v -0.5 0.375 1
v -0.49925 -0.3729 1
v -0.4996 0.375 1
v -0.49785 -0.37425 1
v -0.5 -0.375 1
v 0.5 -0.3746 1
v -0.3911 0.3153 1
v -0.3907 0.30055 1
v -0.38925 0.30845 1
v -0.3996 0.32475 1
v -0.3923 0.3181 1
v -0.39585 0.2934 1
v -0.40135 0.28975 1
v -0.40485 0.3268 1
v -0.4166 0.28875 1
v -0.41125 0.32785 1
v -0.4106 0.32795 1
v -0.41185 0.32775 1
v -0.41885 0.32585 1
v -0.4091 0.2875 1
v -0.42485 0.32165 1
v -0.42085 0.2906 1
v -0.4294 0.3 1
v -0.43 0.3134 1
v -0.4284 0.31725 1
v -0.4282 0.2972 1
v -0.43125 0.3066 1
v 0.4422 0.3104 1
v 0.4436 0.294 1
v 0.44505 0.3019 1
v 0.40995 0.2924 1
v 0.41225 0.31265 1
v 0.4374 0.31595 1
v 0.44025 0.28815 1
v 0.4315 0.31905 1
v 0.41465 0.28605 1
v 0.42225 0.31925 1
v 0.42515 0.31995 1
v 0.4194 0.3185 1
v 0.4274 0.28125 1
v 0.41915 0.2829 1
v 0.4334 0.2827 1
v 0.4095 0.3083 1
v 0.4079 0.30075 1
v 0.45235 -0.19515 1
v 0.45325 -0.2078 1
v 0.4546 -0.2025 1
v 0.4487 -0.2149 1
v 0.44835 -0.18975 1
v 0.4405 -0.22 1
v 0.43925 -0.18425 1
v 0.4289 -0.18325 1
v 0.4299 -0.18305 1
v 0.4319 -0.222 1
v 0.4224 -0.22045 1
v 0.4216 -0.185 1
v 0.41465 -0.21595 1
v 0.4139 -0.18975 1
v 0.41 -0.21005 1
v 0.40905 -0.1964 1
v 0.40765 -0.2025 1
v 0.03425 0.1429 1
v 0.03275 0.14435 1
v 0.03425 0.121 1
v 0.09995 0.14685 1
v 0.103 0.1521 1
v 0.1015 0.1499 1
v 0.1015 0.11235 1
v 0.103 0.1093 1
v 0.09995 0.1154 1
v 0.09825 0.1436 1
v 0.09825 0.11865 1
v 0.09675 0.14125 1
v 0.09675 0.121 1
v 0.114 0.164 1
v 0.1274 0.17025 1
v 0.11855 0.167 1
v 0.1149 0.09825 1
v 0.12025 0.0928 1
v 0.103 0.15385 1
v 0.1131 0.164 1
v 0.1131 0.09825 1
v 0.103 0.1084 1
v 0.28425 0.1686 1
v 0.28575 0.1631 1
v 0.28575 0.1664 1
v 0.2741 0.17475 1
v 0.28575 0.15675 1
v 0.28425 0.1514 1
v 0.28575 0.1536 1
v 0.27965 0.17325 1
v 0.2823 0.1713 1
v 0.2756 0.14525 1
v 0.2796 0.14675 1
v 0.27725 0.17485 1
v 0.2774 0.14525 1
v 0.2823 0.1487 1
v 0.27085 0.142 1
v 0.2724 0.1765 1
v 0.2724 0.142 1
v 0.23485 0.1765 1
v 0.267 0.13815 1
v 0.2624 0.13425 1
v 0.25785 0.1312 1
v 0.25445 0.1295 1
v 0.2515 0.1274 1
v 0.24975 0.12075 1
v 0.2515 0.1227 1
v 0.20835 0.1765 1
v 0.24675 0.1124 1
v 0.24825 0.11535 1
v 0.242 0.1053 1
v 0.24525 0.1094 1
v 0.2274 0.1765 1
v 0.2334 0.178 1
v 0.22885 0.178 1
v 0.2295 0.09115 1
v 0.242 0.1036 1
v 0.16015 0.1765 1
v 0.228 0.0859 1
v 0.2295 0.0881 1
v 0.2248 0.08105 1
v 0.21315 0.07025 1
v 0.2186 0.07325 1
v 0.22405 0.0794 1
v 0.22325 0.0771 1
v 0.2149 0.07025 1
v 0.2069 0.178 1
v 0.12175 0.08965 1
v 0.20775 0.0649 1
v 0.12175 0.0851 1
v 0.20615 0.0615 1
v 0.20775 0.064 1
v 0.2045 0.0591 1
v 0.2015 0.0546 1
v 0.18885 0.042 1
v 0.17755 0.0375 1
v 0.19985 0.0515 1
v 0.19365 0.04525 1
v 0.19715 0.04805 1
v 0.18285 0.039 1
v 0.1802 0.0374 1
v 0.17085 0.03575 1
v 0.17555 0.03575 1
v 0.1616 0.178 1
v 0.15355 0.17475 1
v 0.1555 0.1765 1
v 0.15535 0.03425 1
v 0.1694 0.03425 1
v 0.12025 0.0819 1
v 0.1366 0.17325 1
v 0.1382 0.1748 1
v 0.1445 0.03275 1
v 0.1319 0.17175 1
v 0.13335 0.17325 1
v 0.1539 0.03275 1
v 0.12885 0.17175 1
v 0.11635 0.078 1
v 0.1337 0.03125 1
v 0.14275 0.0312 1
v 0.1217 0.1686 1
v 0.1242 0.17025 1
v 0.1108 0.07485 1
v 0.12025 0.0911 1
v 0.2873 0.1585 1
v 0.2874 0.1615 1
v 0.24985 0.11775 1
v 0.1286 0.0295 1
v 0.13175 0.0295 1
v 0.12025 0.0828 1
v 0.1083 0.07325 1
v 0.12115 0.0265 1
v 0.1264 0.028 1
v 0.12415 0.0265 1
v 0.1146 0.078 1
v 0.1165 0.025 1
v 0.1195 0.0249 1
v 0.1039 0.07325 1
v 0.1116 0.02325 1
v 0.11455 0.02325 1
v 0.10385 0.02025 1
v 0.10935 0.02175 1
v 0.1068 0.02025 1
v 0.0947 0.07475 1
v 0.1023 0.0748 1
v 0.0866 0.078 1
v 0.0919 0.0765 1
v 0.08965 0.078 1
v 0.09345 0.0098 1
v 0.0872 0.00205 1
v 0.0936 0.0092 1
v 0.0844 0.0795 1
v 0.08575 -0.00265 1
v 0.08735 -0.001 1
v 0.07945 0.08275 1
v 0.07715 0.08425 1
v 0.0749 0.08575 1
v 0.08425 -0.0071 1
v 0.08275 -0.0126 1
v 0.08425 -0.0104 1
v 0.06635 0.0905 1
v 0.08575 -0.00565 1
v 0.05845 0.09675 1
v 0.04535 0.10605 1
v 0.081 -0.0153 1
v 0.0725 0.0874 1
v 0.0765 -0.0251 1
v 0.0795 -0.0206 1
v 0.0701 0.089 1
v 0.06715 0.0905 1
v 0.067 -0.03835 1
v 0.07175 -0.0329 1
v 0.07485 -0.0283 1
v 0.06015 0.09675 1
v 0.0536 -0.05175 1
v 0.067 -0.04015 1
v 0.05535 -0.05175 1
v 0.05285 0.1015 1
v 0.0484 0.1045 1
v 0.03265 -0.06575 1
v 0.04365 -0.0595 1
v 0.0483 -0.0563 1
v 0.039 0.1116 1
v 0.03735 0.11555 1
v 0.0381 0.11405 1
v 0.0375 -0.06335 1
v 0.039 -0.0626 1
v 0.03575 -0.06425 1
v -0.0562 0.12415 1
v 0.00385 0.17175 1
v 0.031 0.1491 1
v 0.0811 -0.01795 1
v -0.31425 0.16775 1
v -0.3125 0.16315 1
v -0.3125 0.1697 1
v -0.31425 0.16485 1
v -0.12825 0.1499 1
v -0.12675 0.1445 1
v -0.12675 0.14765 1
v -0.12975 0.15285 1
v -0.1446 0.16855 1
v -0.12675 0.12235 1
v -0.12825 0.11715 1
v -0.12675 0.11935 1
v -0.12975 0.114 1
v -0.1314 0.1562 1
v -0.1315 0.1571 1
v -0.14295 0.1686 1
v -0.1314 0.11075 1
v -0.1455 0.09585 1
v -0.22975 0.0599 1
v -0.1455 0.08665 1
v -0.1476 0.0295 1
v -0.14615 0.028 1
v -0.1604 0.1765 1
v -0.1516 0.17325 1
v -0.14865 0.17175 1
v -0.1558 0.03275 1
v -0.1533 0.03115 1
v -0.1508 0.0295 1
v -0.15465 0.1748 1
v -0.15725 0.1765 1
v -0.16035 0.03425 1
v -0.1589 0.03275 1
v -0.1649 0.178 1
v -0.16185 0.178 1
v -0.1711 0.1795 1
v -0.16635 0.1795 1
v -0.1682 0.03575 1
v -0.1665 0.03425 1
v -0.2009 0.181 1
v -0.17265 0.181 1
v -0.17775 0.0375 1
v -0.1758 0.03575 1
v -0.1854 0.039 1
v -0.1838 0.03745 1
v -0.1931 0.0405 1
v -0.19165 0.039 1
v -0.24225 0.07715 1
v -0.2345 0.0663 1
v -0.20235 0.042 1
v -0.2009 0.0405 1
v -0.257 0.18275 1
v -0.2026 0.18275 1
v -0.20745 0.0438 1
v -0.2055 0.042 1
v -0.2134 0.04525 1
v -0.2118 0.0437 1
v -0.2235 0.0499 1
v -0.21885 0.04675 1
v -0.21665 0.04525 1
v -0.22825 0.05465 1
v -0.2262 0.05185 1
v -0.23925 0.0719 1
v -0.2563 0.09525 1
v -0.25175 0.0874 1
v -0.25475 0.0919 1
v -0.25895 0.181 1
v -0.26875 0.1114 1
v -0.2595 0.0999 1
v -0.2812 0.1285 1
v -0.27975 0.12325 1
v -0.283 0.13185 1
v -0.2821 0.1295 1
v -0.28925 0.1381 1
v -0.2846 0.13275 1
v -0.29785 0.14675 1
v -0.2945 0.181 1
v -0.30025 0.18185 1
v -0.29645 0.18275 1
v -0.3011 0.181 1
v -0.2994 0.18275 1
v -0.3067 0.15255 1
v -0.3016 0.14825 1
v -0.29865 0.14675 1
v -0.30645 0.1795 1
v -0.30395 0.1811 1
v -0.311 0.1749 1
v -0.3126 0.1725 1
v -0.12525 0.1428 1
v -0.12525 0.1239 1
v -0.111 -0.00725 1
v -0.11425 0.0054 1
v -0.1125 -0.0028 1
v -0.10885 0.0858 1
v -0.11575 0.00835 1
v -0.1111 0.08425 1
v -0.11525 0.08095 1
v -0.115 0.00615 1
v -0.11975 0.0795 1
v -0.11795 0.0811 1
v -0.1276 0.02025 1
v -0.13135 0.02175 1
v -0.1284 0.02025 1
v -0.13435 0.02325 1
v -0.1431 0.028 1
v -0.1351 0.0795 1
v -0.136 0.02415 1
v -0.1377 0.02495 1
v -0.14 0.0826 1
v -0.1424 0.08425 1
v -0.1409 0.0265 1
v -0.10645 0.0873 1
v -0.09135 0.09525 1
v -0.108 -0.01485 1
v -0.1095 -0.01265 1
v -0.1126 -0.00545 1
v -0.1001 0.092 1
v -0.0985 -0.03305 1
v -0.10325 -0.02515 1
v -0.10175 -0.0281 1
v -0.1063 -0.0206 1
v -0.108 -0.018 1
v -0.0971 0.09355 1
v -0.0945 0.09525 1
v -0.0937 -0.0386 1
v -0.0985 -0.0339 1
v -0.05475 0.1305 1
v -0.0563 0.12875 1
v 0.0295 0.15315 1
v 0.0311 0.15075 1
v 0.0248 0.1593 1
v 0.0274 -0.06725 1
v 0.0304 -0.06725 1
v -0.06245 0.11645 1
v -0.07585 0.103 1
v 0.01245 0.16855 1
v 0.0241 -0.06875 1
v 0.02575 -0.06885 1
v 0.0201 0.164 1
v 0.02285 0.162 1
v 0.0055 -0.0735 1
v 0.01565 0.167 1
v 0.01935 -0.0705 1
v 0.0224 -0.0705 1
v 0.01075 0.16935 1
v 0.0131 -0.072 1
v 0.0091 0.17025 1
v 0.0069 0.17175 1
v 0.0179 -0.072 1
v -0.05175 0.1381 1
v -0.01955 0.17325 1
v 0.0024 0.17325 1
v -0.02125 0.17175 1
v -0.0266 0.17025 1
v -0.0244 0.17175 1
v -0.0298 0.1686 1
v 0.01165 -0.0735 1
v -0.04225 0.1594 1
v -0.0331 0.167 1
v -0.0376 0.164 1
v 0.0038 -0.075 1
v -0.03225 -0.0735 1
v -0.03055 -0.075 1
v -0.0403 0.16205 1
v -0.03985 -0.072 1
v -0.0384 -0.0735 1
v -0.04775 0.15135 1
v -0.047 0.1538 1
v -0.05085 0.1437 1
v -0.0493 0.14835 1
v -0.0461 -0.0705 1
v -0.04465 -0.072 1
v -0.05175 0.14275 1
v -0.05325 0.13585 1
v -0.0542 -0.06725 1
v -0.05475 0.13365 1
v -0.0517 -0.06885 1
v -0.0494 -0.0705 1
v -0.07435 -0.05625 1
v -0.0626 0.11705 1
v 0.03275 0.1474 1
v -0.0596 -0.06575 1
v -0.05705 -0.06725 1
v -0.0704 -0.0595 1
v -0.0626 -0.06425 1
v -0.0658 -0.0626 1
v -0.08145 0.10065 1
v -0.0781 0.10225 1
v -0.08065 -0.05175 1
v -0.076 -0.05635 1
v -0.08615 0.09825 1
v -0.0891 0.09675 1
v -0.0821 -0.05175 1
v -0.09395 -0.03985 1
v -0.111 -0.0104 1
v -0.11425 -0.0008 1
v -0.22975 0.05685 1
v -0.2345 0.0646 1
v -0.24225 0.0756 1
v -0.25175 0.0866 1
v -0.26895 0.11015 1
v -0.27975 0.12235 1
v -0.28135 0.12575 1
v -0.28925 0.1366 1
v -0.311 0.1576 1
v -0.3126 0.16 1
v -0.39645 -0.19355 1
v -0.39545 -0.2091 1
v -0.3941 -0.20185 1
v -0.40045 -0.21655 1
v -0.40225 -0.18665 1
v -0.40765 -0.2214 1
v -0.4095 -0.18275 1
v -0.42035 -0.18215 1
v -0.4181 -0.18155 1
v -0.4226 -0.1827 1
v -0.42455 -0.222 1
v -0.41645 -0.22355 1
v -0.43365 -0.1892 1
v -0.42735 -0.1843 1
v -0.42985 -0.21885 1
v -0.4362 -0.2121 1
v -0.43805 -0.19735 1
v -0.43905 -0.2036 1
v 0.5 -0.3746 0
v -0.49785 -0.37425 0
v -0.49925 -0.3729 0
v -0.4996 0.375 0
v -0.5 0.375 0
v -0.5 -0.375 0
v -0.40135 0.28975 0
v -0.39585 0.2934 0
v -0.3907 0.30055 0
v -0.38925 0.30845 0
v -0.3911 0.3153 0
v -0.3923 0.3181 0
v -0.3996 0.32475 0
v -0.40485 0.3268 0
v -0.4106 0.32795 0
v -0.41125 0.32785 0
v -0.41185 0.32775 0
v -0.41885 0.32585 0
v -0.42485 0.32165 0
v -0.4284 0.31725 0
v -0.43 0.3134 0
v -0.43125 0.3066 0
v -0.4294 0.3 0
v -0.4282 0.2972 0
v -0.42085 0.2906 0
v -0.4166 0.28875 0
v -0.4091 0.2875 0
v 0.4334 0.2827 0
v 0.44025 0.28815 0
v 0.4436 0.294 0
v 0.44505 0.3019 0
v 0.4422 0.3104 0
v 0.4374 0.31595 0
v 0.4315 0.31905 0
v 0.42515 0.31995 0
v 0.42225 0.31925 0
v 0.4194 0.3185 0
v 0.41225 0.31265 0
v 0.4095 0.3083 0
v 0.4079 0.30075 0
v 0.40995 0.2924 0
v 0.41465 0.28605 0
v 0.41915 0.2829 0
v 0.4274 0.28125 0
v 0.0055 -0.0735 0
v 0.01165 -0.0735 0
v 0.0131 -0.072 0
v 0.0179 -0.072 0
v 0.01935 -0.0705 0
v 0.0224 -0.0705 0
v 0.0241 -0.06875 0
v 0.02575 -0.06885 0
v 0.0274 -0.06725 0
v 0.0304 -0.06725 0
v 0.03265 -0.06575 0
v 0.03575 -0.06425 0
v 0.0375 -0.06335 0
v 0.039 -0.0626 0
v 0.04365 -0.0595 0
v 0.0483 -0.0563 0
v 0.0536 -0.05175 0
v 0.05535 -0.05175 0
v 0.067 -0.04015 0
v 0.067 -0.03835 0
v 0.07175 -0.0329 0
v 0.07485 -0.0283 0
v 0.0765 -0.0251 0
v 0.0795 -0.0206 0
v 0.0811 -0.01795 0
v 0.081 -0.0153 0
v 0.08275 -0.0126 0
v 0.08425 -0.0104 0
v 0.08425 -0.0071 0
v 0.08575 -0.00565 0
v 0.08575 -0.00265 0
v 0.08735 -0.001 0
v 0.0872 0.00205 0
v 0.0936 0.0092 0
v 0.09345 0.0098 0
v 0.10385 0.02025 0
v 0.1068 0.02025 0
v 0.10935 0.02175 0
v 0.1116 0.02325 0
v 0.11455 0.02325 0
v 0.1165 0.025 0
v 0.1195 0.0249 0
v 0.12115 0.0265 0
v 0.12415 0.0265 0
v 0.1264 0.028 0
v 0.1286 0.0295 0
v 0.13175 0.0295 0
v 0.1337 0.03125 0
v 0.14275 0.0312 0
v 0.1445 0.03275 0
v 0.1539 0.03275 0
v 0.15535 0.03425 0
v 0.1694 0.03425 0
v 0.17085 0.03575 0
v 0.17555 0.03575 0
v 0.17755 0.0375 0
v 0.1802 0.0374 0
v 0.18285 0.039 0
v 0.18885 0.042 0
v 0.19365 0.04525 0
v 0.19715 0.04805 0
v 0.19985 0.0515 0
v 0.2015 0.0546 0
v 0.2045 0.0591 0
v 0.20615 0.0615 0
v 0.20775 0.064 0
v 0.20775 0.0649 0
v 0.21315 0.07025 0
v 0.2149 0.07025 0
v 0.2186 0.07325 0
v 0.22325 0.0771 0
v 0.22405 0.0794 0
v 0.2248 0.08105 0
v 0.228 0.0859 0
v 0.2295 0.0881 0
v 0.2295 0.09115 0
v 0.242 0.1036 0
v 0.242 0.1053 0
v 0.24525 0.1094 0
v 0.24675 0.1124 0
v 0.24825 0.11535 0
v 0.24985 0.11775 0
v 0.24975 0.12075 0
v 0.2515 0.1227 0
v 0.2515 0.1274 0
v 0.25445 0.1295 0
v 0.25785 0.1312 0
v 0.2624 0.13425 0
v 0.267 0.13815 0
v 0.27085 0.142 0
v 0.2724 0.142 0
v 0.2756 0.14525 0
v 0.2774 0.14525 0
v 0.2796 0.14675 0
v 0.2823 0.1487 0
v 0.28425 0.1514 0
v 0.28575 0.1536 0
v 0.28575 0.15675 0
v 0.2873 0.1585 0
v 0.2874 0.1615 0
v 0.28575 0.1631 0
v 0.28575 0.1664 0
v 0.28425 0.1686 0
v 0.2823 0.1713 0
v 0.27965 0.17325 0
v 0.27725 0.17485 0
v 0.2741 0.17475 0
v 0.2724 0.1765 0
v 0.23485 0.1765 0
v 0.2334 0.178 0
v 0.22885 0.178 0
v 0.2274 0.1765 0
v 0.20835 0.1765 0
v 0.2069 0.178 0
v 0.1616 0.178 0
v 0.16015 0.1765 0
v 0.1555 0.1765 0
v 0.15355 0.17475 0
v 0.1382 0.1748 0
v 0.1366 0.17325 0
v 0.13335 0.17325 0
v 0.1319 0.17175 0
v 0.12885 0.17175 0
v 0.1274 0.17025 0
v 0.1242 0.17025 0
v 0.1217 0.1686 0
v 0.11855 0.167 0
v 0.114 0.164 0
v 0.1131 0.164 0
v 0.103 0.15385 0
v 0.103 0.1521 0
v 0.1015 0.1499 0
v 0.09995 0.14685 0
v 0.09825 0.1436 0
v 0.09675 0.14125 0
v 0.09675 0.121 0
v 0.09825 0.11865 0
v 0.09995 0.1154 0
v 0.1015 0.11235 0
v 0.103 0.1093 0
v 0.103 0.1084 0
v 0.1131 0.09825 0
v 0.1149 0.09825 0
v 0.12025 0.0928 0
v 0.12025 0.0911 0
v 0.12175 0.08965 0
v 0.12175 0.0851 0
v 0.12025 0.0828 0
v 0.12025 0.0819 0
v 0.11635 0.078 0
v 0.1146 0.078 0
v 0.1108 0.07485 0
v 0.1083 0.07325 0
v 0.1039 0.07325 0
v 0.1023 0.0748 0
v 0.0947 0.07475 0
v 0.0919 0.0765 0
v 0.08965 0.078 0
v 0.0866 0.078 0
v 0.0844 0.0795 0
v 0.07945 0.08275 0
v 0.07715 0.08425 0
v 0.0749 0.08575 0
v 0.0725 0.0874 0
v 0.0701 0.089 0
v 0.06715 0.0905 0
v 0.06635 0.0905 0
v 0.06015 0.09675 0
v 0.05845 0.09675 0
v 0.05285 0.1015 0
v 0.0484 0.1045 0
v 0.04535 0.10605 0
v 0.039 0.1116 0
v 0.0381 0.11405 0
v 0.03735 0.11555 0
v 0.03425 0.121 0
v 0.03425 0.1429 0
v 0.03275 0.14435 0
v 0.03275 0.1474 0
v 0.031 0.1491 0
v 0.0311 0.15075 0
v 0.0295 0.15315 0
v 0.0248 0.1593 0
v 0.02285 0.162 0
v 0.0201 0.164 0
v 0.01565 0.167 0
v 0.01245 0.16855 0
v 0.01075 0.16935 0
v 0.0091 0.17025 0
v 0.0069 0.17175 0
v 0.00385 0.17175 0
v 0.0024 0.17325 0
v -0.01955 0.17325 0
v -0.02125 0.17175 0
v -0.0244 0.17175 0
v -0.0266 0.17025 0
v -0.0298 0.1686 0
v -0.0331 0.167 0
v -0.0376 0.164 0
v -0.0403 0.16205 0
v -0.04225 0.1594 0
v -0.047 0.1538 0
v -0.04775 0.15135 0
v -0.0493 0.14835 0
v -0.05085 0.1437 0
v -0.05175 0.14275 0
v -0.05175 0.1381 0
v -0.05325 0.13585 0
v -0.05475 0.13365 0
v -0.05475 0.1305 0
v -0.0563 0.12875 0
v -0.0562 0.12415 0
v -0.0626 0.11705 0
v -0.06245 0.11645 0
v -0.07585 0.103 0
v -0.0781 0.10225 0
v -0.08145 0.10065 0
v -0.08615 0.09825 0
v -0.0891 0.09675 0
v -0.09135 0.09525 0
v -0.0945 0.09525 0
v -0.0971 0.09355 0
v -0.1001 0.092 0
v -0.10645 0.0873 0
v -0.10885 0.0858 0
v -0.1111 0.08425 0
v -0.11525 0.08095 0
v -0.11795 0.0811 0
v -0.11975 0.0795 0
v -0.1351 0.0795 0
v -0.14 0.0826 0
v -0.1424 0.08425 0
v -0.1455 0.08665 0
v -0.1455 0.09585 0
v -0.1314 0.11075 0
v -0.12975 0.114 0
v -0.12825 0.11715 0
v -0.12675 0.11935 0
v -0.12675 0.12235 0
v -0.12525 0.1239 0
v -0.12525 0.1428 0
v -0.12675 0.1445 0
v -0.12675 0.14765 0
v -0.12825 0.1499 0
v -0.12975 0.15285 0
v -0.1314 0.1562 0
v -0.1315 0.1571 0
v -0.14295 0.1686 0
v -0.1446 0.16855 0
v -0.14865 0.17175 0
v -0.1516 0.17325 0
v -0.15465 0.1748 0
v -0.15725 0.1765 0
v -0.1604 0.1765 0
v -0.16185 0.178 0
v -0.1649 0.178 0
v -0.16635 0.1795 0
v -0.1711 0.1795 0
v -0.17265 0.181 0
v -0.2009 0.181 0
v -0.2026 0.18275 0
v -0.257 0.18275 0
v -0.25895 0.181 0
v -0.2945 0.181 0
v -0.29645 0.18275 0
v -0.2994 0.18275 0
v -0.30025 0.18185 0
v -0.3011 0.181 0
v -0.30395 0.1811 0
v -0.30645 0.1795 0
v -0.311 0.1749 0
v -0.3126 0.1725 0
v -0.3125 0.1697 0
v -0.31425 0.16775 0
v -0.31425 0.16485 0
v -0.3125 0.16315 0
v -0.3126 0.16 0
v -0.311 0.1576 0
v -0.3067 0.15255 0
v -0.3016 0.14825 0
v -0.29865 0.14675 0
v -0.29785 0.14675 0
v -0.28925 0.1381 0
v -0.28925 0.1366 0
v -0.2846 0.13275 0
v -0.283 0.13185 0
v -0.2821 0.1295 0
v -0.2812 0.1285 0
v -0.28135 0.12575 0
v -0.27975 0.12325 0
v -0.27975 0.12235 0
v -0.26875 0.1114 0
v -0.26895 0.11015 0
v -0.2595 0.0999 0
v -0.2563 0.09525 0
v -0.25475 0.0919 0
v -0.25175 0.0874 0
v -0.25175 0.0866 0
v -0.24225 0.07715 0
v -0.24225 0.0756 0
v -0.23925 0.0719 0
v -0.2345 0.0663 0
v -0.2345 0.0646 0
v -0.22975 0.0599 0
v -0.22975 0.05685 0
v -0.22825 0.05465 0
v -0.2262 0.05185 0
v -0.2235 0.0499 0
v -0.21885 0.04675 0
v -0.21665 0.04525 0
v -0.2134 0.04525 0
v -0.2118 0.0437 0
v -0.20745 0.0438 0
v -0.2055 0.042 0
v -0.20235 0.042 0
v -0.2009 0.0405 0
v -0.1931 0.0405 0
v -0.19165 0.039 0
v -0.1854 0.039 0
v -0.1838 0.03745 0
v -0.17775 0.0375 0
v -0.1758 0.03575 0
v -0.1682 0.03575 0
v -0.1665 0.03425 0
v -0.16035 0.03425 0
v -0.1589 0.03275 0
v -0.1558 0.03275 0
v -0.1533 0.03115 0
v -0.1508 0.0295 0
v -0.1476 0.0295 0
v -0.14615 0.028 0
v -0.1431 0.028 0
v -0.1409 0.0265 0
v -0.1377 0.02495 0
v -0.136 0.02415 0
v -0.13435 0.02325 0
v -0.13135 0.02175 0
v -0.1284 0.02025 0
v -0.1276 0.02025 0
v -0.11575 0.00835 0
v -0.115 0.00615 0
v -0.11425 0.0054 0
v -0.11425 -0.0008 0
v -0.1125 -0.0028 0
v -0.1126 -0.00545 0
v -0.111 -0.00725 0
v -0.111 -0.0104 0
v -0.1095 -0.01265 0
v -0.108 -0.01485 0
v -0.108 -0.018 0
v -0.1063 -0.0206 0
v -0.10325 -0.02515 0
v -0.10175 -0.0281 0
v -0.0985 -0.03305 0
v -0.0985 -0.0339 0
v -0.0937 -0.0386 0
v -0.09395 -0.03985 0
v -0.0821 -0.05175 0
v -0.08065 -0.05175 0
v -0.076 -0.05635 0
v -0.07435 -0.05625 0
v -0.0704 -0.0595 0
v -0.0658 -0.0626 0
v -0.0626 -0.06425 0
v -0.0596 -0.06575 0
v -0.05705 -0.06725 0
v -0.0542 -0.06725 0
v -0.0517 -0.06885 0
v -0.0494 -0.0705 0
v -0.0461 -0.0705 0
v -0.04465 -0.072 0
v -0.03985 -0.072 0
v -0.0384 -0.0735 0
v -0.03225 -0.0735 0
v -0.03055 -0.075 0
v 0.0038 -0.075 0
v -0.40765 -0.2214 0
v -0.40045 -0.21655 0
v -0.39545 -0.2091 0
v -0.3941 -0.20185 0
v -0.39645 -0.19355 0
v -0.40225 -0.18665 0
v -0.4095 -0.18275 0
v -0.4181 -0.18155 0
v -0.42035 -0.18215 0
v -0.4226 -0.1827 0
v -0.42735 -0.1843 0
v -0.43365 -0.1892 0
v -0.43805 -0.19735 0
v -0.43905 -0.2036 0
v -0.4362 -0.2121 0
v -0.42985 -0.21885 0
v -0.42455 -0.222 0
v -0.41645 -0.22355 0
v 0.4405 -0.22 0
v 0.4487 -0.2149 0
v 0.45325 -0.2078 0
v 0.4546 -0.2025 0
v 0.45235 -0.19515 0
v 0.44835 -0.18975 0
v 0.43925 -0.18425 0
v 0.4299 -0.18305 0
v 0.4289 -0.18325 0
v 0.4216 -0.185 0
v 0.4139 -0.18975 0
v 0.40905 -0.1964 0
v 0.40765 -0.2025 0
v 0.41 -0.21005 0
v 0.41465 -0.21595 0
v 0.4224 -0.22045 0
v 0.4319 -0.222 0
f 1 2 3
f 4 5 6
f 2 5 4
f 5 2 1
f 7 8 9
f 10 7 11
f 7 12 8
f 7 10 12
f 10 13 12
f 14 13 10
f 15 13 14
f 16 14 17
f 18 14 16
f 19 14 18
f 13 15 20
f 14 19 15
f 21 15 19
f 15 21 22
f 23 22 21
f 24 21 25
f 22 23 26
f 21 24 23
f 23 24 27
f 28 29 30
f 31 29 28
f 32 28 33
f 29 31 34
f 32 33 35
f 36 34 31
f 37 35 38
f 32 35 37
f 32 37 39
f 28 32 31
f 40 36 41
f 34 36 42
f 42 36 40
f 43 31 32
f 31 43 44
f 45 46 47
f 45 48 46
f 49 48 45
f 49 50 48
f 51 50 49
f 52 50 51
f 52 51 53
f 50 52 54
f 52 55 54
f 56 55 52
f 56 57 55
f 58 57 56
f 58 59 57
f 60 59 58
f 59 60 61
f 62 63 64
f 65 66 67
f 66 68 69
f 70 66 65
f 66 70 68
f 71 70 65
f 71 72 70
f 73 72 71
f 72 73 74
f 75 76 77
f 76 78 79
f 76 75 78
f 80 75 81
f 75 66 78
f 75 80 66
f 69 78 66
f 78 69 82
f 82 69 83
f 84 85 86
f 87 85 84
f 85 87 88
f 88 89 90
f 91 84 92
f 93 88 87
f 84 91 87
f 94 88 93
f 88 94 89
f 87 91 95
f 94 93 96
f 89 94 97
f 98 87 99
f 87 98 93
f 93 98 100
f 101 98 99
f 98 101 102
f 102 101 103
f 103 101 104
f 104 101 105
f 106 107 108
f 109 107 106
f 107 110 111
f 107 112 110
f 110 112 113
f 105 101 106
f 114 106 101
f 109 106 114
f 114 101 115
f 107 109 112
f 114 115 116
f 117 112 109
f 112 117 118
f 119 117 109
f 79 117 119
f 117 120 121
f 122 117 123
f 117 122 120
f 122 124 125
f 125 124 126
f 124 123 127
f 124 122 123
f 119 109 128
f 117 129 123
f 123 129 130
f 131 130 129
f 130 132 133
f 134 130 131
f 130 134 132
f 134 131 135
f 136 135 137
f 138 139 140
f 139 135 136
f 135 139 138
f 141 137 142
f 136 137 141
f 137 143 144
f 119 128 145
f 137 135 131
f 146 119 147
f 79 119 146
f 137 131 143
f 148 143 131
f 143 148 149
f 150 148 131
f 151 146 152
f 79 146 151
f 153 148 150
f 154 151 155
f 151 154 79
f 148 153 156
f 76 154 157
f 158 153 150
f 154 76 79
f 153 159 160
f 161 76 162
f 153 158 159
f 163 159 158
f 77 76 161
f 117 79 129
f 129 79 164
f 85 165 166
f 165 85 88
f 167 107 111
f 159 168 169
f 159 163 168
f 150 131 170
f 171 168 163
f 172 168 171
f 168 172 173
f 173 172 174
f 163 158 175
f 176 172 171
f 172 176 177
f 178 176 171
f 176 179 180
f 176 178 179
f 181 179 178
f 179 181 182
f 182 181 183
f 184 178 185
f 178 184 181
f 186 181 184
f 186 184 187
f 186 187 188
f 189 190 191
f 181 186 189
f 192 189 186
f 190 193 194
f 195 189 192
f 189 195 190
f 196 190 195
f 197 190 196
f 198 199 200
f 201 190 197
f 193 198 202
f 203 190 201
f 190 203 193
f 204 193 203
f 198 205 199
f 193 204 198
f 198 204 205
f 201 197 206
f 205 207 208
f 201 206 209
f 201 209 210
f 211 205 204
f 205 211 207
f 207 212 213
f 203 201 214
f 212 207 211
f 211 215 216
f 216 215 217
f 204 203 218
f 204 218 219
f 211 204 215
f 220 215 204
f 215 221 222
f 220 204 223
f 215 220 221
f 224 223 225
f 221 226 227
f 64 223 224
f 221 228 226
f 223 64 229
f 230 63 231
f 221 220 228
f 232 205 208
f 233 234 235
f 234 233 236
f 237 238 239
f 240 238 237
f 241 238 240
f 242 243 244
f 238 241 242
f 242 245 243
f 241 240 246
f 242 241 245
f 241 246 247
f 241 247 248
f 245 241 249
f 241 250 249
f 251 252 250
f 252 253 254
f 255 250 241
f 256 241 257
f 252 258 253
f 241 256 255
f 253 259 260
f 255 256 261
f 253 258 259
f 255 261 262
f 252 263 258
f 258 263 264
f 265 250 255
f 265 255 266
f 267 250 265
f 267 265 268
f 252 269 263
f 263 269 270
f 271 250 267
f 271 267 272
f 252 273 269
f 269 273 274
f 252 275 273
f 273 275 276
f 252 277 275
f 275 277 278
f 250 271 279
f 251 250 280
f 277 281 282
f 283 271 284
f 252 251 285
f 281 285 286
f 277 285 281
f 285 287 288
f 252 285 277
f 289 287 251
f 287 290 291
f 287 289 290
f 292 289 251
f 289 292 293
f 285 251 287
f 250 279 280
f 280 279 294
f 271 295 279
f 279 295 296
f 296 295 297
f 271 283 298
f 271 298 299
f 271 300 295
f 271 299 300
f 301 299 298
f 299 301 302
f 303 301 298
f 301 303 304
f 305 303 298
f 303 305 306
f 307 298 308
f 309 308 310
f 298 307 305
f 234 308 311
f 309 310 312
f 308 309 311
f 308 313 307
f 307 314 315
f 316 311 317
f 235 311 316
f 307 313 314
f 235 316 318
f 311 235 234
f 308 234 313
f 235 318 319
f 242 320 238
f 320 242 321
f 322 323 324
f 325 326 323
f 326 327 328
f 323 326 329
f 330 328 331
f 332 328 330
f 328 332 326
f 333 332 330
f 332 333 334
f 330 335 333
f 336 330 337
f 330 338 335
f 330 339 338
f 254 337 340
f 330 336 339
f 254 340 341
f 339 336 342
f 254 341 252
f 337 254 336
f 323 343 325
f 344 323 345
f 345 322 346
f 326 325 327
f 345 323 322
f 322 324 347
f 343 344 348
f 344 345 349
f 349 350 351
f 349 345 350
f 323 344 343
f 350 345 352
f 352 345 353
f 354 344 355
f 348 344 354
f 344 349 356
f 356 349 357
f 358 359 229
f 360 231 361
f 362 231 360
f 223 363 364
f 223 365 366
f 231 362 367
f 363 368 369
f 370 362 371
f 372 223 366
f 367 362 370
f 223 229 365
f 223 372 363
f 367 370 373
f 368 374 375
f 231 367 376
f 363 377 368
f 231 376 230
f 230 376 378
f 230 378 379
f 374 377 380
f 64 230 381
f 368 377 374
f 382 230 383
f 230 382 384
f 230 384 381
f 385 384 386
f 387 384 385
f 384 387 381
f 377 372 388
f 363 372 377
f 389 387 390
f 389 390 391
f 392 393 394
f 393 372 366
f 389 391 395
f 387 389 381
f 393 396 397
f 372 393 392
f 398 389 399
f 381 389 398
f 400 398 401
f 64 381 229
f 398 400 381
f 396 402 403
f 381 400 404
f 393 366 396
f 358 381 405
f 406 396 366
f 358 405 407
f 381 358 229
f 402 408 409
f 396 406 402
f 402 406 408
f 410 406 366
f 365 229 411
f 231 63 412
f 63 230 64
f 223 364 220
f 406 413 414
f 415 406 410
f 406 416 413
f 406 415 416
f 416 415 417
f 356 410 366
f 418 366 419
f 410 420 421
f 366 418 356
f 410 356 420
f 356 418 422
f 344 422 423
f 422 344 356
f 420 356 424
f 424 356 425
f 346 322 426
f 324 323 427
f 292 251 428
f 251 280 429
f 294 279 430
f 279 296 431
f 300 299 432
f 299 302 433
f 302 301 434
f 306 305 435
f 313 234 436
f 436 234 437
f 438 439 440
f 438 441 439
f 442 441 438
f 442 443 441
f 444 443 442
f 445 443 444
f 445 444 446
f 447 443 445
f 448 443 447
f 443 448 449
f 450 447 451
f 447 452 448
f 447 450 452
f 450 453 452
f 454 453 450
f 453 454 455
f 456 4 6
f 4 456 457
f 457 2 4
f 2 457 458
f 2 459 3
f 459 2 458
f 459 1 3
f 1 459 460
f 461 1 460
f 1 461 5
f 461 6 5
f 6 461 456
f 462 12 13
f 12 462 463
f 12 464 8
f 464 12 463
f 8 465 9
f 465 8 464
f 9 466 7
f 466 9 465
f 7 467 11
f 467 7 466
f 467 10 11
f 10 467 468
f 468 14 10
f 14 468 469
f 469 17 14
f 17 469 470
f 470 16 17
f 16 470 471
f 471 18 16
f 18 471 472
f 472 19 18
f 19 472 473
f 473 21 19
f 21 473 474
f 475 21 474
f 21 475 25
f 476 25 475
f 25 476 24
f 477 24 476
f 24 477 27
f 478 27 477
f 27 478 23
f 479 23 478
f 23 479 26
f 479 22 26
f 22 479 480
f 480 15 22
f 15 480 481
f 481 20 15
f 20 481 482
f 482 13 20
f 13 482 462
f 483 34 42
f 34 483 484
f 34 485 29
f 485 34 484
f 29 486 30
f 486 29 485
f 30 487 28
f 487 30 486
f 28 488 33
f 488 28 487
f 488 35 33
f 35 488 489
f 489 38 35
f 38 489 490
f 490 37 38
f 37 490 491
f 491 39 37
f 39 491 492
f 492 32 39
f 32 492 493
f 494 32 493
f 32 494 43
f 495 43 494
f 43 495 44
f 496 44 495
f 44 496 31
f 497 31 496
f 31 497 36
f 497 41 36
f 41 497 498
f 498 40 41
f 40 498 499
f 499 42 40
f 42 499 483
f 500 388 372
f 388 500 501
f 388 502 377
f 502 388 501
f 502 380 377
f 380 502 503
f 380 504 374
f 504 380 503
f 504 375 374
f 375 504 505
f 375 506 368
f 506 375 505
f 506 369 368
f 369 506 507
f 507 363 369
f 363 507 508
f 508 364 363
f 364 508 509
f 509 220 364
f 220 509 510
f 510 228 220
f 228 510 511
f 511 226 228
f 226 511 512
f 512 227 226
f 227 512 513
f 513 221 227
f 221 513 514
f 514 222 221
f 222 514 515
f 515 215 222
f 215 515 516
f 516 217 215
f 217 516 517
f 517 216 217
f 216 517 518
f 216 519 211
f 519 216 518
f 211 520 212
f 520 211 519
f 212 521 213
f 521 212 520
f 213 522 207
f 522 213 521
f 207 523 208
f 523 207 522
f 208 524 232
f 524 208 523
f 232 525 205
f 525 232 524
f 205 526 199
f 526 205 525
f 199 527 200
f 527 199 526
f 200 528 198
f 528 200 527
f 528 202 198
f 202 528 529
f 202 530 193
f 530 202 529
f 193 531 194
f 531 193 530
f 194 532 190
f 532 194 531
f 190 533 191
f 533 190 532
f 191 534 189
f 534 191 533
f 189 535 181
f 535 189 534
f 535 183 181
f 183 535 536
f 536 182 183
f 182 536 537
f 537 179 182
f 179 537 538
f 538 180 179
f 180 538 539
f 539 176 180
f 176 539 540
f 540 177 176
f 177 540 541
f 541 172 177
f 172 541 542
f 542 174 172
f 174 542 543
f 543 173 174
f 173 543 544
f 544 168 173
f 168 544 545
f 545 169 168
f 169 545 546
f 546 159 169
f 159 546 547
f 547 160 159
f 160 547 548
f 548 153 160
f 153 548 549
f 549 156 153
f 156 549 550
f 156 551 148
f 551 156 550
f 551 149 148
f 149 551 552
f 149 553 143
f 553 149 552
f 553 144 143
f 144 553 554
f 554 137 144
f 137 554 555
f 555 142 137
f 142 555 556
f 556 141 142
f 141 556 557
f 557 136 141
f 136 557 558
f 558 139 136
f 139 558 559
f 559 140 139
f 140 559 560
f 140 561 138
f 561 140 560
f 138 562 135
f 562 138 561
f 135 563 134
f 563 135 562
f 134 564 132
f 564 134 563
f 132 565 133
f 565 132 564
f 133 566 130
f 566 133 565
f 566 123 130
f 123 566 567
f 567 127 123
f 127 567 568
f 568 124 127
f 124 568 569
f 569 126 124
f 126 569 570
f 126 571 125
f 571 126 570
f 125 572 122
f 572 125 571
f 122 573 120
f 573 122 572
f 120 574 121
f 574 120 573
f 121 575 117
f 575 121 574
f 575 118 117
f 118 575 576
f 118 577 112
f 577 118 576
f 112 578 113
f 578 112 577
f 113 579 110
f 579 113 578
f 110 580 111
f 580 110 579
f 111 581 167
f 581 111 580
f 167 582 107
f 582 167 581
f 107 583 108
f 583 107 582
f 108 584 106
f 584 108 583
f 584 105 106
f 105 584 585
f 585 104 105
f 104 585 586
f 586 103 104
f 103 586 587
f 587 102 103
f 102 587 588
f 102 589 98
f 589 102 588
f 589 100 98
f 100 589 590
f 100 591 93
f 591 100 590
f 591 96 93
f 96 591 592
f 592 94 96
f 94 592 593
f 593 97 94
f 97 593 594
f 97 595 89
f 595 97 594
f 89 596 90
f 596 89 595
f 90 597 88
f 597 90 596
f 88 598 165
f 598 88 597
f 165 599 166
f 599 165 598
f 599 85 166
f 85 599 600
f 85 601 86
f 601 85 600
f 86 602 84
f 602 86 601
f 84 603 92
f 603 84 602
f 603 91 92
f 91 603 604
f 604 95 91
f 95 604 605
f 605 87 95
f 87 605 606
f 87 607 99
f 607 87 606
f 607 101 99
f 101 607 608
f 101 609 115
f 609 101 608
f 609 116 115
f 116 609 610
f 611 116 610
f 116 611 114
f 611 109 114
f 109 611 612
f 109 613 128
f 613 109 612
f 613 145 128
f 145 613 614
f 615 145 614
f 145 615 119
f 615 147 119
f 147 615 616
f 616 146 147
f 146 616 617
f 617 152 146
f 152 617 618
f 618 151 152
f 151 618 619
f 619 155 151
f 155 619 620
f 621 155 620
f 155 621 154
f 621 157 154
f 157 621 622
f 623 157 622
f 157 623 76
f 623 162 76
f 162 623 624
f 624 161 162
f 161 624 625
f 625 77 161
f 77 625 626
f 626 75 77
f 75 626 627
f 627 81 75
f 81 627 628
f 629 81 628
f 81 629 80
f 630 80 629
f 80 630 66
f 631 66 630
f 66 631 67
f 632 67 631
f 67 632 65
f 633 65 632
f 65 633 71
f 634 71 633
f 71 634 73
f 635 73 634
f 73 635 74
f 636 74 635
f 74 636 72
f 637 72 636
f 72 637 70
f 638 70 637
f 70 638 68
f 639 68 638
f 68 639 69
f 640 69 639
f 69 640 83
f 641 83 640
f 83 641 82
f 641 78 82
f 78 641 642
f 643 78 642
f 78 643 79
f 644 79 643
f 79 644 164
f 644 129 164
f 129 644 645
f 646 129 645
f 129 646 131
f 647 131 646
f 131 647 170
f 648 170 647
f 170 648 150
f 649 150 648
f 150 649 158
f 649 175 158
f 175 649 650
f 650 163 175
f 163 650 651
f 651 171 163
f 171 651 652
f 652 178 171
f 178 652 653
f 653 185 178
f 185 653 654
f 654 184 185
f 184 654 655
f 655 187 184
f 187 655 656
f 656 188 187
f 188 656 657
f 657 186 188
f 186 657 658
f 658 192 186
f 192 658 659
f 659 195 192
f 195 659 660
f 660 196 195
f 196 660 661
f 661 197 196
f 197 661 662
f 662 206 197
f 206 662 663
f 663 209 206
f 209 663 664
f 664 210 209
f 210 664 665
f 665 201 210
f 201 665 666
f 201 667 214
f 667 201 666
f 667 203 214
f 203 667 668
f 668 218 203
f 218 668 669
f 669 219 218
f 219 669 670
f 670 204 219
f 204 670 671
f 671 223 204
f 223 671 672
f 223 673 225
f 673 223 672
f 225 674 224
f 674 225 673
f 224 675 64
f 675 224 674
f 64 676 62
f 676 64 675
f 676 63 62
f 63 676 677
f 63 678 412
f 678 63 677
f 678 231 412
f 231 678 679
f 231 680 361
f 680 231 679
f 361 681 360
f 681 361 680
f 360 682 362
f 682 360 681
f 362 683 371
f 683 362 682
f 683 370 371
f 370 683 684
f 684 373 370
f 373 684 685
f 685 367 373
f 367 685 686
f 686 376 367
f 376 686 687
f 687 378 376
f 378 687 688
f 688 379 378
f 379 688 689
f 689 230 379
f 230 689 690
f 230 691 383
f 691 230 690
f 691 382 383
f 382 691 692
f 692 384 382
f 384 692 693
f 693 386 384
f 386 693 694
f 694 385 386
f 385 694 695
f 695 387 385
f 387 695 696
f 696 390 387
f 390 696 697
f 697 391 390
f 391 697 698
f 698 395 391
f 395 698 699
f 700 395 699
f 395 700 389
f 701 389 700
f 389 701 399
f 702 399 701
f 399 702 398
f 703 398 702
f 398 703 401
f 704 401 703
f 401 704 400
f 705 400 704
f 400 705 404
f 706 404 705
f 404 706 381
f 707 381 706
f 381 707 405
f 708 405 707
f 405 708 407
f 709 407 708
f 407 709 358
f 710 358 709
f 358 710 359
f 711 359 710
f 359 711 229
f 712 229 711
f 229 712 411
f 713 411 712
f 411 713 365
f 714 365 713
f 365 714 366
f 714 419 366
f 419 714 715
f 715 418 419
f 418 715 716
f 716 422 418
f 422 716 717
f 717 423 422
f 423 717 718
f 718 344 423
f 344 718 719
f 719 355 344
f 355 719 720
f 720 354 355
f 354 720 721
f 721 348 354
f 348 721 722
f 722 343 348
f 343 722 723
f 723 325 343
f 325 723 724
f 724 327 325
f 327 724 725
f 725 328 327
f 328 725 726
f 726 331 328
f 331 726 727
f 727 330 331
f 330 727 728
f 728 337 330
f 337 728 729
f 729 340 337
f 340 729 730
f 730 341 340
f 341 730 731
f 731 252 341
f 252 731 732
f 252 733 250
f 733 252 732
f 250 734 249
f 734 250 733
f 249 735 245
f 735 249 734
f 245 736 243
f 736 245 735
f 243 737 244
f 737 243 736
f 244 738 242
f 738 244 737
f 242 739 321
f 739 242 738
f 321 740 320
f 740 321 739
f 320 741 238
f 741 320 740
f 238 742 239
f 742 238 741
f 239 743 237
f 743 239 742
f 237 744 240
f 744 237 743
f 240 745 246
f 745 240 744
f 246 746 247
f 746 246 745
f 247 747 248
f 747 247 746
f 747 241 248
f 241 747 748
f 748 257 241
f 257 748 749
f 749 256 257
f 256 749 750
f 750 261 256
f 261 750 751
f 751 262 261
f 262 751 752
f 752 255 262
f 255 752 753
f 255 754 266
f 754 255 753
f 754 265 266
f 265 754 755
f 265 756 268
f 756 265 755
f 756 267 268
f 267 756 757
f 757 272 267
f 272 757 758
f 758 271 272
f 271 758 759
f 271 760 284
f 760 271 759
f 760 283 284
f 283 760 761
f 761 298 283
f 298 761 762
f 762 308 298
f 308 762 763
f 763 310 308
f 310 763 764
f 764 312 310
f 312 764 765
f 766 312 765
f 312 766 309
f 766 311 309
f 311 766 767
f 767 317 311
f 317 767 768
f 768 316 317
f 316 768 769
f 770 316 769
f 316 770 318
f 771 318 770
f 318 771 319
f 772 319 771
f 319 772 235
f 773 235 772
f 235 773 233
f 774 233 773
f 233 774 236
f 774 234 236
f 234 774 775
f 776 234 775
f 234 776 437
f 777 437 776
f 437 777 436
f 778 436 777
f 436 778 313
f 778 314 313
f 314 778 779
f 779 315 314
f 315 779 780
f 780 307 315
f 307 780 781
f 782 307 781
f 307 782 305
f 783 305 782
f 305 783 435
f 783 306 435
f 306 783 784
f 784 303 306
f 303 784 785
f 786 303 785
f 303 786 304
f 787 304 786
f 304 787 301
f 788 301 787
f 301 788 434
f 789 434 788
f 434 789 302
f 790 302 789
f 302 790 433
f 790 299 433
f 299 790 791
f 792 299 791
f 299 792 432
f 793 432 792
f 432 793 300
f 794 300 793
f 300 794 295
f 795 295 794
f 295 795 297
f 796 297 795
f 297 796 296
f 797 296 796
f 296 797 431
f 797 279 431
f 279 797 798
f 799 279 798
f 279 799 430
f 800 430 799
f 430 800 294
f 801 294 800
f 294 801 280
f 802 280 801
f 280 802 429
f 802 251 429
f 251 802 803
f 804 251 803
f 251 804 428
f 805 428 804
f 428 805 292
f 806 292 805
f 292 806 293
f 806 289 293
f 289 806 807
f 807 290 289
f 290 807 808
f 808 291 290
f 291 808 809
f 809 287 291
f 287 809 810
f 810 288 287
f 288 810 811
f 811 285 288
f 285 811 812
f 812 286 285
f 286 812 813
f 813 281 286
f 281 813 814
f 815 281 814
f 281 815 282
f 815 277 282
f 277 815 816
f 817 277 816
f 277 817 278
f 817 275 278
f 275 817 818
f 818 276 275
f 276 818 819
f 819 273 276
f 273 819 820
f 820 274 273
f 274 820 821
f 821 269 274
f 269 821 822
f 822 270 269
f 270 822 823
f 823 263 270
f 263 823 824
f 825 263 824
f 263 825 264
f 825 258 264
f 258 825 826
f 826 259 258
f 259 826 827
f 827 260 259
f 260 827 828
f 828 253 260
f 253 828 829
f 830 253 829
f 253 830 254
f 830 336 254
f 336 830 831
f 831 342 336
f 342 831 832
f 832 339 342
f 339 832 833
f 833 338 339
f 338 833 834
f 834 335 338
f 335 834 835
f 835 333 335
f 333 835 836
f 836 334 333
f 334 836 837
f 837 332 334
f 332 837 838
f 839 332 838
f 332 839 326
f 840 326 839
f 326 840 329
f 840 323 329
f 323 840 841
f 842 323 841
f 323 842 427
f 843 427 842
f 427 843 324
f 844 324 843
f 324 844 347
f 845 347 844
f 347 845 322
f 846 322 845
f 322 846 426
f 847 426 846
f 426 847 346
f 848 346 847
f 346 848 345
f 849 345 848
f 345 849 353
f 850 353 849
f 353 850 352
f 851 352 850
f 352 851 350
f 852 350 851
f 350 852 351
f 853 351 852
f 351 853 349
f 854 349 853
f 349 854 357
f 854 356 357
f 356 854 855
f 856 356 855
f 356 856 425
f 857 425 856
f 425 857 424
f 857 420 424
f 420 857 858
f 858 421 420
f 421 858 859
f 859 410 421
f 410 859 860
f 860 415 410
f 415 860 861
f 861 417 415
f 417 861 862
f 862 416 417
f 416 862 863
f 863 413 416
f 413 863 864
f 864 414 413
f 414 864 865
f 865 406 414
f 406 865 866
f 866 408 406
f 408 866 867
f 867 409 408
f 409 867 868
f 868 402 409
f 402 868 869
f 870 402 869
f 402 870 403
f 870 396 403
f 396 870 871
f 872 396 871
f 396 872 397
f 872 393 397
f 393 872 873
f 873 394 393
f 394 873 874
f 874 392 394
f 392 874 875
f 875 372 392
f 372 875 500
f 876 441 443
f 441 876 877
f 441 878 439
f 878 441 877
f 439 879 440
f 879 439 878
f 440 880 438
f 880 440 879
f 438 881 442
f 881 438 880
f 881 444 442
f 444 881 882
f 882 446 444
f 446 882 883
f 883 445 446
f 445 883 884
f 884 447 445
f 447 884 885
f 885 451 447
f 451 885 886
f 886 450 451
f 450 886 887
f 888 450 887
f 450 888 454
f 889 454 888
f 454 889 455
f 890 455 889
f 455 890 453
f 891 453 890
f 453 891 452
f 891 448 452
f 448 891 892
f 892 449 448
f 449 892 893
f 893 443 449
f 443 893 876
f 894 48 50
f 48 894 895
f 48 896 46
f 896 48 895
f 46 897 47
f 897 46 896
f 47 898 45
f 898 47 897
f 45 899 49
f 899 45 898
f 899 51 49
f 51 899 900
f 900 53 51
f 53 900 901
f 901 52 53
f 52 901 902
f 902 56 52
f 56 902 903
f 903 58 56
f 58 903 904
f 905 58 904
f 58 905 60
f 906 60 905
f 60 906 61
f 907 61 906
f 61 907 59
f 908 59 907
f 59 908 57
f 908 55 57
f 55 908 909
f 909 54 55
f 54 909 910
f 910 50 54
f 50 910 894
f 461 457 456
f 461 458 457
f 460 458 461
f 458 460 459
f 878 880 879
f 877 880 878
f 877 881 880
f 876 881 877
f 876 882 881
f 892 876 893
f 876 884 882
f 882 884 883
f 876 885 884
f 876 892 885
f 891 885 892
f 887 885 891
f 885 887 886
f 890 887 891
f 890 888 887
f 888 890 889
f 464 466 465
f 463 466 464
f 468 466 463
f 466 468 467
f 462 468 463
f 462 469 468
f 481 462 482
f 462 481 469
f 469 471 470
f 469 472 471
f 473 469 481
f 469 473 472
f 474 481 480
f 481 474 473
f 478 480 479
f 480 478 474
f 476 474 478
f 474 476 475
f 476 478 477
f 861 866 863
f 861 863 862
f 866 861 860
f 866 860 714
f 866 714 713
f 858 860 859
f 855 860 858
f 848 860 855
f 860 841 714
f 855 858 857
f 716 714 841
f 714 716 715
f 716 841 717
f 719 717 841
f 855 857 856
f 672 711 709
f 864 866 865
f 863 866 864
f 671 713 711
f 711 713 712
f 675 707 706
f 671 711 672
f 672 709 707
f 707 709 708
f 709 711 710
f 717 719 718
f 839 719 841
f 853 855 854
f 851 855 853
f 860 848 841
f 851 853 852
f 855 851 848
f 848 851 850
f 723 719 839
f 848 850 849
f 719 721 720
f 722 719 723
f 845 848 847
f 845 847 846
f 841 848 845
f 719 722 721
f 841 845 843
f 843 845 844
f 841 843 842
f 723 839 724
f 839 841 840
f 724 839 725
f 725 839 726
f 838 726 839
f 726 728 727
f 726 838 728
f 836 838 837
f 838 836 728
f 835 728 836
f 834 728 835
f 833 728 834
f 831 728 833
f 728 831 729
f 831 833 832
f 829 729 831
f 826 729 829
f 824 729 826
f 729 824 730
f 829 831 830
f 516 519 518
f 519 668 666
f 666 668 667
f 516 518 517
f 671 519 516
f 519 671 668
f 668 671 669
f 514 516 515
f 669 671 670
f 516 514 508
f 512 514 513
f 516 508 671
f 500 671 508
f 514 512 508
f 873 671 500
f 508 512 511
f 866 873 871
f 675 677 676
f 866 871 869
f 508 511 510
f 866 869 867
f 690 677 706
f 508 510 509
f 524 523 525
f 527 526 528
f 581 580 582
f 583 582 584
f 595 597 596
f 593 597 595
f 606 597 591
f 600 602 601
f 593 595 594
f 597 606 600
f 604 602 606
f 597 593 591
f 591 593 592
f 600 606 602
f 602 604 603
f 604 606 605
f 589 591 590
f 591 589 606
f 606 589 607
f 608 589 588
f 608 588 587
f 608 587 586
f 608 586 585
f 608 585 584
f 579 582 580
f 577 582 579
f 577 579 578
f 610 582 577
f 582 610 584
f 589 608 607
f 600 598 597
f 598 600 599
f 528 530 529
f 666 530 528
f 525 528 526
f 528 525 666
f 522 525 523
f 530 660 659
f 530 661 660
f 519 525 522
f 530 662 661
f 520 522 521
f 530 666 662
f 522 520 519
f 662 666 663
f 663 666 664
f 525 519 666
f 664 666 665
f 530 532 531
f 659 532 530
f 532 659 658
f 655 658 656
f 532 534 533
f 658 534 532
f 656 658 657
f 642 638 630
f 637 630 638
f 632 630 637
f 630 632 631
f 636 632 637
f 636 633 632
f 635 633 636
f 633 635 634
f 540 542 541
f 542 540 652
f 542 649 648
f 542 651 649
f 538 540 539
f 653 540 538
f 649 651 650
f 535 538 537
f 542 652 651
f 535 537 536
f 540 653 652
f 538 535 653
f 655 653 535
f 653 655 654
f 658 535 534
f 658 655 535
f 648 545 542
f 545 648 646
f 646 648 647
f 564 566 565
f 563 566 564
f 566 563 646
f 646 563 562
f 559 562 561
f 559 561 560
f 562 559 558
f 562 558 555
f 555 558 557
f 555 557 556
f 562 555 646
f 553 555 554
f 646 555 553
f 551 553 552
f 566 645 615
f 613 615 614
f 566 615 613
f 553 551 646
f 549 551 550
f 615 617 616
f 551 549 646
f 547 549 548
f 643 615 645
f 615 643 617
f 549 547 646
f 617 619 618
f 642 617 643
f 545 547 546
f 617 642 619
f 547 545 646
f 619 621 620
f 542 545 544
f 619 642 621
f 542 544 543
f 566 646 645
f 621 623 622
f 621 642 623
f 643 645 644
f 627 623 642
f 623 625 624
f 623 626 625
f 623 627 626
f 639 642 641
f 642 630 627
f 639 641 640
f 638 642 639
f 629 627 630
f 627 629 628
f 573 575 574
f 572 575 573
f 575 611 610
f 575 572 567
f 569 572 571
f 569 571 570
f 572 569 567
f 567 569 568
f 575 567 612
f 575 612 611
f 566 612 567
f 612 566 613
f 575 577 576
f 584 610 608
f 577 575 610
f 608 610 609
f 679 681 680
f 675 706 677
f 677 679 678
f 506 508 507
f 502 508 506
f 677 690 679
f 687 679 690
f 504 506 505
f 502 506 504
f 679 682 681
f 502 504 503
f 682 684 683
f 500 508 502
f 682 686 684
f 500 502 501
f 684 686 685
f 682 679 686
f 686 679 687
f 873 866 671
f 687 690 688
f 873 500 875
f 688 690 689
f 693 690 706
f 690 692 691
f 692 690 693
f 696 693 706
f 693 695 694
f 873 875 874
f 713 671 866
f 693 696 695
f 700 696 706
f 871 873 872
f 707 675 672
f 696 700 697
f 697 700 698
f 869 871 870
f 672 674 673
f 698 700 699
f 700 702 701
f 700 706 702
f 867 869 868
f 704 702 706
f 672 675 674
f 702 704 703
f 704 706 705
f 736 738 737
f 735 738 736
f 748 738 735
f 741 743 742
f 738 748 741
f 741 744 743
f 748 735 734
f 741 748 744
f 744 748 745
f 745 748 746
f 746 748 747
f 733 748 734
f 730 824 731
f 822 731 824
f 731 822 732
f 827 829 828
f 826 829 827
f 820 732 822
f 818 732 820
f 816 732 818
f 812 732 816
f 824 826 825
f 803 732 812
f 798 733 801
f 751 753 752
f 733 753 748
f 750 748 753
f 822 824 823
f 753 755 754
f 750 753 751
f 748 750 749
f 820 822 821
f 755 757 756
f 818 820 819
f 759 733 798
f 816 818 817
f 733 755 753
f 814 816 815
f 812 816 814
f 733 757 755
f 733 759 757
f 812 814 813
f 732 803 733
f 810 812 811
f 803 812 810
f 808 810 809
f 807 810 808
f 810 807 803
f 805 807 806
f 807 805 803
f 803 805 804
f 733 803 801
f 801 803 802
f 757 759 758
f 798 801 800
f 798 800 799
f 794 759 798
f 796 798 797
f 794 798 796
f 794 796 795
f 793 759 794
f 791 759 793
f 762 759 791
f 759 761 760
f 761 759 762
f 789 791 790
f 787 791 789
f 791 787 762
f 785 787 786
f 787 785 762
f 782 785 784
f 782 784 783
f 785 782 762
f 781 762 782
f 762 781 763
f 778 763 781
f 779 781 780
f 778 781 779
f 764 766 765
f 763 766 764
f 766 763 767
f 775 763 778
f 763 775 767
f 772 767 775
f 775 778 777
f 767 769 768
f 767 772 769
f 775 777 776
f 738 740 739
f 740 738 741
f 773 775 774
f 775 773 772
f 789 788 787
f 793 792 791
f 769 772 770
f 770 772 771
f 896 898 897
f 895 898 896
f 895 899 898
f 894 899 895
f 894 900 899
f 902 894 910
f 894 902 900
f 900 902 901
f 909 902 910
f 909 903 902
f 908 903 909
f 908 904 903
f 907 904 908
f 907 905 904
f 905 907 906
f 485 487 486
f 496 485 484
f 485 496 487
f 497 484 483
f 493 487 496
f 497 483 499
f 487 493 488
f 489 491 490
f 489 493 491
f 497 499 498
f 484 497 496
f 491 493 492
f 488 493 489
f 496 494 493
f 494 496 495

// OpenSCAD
module FlyingFaround_1()
{
 /* Generated by trace2scad version 20150415
    http://aggregate.org/MAKE/TRACE2SCAD/
    Optimized model has 460/1292 original points
 */
 color([0.5, 0.5, 0.5])
 assign(minx=0) /* polygon minx=0 */
 assign(miny=0) /* polygon miny=0 */
 assign(maxx=20000) /* polygon maxx=20000 */
 assign(maxy=15000) /* polygon maxy=15000 */
 assign(dx=maxx-minx)
 assign(dy=maxy-miny)
 assign(maxd=((dx>dy)?dx:dy))
 scale([1/maxd, 1/maxd, 1])
 translate([-minx-dx/2, -miny-dy/2, 0])
 linear_extrude(height=1, convexity=460)
 union() {
  union() {
   polygon([[0,7500],[0,0],[20000,8],[43,15],[15,42],[8,15000],[0,15000]], convexity=5);
   polygon([[1775,14057],[1763,14055],[1623,14017],[1503,13933],[1432,13845],[1400,13768],[1375,13632],[1412,13500],[1436,13444],[1583,13312],[1668,13275],[1818,13250],[1973,13295],[2083,13368],[2186,13511],[2215,13669],[2178,13806],[2154,13862],[2008,13995],[1903,14036],[1788,14059]], convexity=6);
   polygon([[18445,13885],[18388,13870],[18245,13753],[18190,13666],[18158,13515],[18199,13348],[18293,13221],[18383,13158],[18548,13125],[18668,13154],[18805,13263],[18872,13380],[18901,13538],[18844,13708],[18748,13819],[18630,13881],[18503,13899]], convexity=6);
   polygon([[3995,11137],[3978,11120],[3921,11122],[3871,11090],[3780,10998],[3748,10950],[3750,10894],[3715,10855],[3715,10797],[3750,10763],[3748,10700],[3780,10652],[3866,10551],[3968,10465],[4027,10435],[4043,10435],[4215,10262],[4215,10232],[4308,10155],[4340,10137],[4358,10090],[4376,10070],[4373,10015],[4405,9965],[4405,9947],[4625,9728],[4621,9703],[4810,9498],[4874,9405],[4905,9338],[4965,9248],[4965,9232],[5155,9043],[5155,9012],[5215,8938],[5310,8826],[5310,8792],[5405,8698],[5405,8637],[5435,8593],[5476,8537],[5530,8498],[5623,8435],[5667,8405],[5732,8405],[5764,8374],[5851,8376],[5890,8340],[5953,8340],[5982,8310],[6138,8310],[6167,8280],[6292,8280],[6324,8249],[6445,8250],[6484,8215],[6636,8215],[6670,8185],[6793,8185],[6822,8155],[6884,8155],[6934,8123],[6984,8090],[7048,8090],[7077,8060],[7138,8060],[7182,8030],[7246,7999],[7280,7983],[7313,7965],[7373,7935],[7432,7905],[7448,7905],[7685,7667],[7700,7623],[7715,7608],[7715,7484],[7750,7444],[7748,7391],[7780,7355],[7780,7292],[7810,7247],[7840,7203],[7840,7140],[7874,7088],[7935,6997],[7965,6938],[8030,6839],[8030,6822],[8126,6728],[8121,6703],[8358,6465],[8387,6465],[8480,6373],[8513,6375],[8592,6310],[8684,6248],[8748,6215],[8808,6185],[8859,6155],[8916,6155],[8966,6123],[9012,6090],[9078,6090],[9107,6060],[9203,6060],[9232,6030],[9355,6030],[9389,6000],[10076,6000],[10110,6030],[10233,6030],[10262,6060],[10358,6060],[10387,6090],[10448,6090],[10482,6125],[10515,6123],[10548,6155],[10608,6155],[10653,6185],[10715,6215],[10750,6233],[10780,6248],[10873,6310],[10966,6374],[11072,6465],[11107,6465],[11340,6697],[11340,6733],[11435,6842],[11497,6934],[11530,6998],[11590,7088],[11622,7141],[11620,7194],[11655,7248],[11685,7292],[11685,7358],[11715,7387],[11715,7447],[11747,7480],[11744,7541],[11872,7684],[11869,7696],[12077,7905],[12136,7905],[12187,7935],[12232,7965],[12291,7965],[12330,8000],[12390,7998],[12423,8030],[12483,8030],[12528,8060],[12572,8090],[12635,8090],[12674,8125],[12855,8124],[12890,8155],[13078,8155],[13107,8185],[13388,8185],[13417,8215],[13511,8215],[13551,8250],[13604,8248],[13657,8280],[13717,8310],[13777,8340],[13873,8405],[13943,8461],[13997,8530],[14030,8592],[14090,8682],[14123,8730],[14155,8780],[14155,8798],[14263,8905],[14298,8905],[14372,8965],[14465,9042],[14481,9088],[14496,9121],[14560,9218],[14590,9262],[14590,9323],[14840,9572],[14840,9606],[14905,9688],[14935,9748],[14965,9807],[14997,9855],[14995,9915],[15030,9954],[15030,10048],[15089,10090],[15157,10124],[15248,10185],[15340,10263],[15417,10340],[15448,10340],[15512,10405],[15548,10405],[15592,10435],[15646,10474],[15685,10528],[15715,10572],[15715,10635],[15746,10670],[15748,10730],[15715,10762],[15715,10828],[15685,10872],[15646,10926],[15593,10965],[15545,10997],[15482,10995],[15448,11030],[14697,11030],[14668,11060],[14577,11060],[14548,11030],[14167,11030],[14138,11060],[13232,11060],[13203,11030],[13110,11030],[13071,10995],[12764,10996],[12732,10965],[12667,10965],[12638,10935],[12577,10935],[12548,10905],[12484,10905],[12434,10872],[12371,10840],[12280,10780],[12262,10780],[12060,10577],[12060,10542],[12030,10498],[11999,10437],[11965,10372],[11935,10325],[11935,9920],[11965,9873],[11999,9808],[12030,9747],[12060,9686],[12060,9668],[12262,9465],[12298,9465],[12405,9356],[12405,9322],[12435,9293],[12435,9202],[12405,9156],[12405,9138],[12327,9060],[12292,9060],[12216,8997],[12166,8965],[12078,8965],[12046,8996],[11894,8995],[11838,9030],[11793,9060],[11732,9060],[11688,9090],[11589,9155],[11543,9185],[11498,9215],[11450,9248],[11402,9280],[11343,9310],[11327,9310],[11203,9435],[11169,9435],[11057,9530],[10968,9590],[10907,9621],[10780,9732],[10762,9781],[10747,9811],[10685,9920],[10685,10358],[10655,10387],[10655,10448],[10620,10482],[10622,10515],[10590,10563],[10496,10686],[10457,10740],[10402,10780],[10313,10840],[10249,10871],[10215,10887],[10182,10905],[10138,10935],[10077,10935],[10048,10965],[9609,10965],[9575,10935],[9512,10935],[9468,10905],[9404,10872],[9338,10840],[9248,10780],[9194,10741],[9155,10688],[9060,10576],[9045,10527],[9014,10467],[8999,10422],[8983,10374],[8965,10355],[8965,10262],[8935,10217],[8905,10173],[8905,10110],[8874,10075],[8876,9983],[8748,9841],[8751,9829],[8483,9560],[8438,9545],[8371,9513],[8277,9465],[8218,9435],[8173,9405],[8110,9405],[8058,9371],[7998,9340],[7871,9246],[7823,9216],[7778,9185],[7695,9119],[7641,9122],[7605,9090],[7298,9090],[7249,9121],[7200,9152],[7152,9185],[7090,9233],[7090,9417],[7372,9715],[7405,9780],[7435,9843],[7465,9887],[7465,9947],[7495,9978],[7495,10356],[7465,10390],[7465,10453],[7435,10498],[7405,10557],[7372,10624],[7370,10642],[7141,10872],[7108,10871],[7027,10935],[6968,10965],[6907,10996],[6855,11030],[6792,11030],[6763,11060],[6702,11060],[6673,11090],[6578,11090],[6547,11120],[5982,11120],[5948,11155],[4860,11155],[4821,11120],[4110,11120],[4071,11155],[4012,11155]], convexity=136);
   polygon([[1593,3857],[1548,3846],[1453,3814],[1327,3716],[1239,3553],[1219,3428],[1276,3258],[1403,3123],[1509,3060],[1671,3029],[1847,3072],[1991,3169],[2091,3318],[2118,3463],[2071,3629],[1955,3767],[1810,3845],[1638,3869]], convexity=6);
   polygon([[18588,3837],[18578,3835],[18432,3800],[18278,3705],[18181,3572],[18153,3450],[18200,3299],[18293,3181],[18448,3091],[18638,3060],[18810,3100],[18974,3202],[19065,3344],[19092,3450],[19047,3597],[18967,3705],[18785,3815],[18598,3839]], convexity=6);
  }
 }
}

module FlyingFaround()
{
 /* all layers combined, scaled to within a 1mm cube */
 scale([1, 1, 1/1])
 difference() {
  union() {
   scale([1,1,2]) translate([0,0,-0.5]) FlyingFaround_1();
  }
  translate([0,0,-2]) cube([2,2,4],center=true);
 }
}
FlyingFaround();
